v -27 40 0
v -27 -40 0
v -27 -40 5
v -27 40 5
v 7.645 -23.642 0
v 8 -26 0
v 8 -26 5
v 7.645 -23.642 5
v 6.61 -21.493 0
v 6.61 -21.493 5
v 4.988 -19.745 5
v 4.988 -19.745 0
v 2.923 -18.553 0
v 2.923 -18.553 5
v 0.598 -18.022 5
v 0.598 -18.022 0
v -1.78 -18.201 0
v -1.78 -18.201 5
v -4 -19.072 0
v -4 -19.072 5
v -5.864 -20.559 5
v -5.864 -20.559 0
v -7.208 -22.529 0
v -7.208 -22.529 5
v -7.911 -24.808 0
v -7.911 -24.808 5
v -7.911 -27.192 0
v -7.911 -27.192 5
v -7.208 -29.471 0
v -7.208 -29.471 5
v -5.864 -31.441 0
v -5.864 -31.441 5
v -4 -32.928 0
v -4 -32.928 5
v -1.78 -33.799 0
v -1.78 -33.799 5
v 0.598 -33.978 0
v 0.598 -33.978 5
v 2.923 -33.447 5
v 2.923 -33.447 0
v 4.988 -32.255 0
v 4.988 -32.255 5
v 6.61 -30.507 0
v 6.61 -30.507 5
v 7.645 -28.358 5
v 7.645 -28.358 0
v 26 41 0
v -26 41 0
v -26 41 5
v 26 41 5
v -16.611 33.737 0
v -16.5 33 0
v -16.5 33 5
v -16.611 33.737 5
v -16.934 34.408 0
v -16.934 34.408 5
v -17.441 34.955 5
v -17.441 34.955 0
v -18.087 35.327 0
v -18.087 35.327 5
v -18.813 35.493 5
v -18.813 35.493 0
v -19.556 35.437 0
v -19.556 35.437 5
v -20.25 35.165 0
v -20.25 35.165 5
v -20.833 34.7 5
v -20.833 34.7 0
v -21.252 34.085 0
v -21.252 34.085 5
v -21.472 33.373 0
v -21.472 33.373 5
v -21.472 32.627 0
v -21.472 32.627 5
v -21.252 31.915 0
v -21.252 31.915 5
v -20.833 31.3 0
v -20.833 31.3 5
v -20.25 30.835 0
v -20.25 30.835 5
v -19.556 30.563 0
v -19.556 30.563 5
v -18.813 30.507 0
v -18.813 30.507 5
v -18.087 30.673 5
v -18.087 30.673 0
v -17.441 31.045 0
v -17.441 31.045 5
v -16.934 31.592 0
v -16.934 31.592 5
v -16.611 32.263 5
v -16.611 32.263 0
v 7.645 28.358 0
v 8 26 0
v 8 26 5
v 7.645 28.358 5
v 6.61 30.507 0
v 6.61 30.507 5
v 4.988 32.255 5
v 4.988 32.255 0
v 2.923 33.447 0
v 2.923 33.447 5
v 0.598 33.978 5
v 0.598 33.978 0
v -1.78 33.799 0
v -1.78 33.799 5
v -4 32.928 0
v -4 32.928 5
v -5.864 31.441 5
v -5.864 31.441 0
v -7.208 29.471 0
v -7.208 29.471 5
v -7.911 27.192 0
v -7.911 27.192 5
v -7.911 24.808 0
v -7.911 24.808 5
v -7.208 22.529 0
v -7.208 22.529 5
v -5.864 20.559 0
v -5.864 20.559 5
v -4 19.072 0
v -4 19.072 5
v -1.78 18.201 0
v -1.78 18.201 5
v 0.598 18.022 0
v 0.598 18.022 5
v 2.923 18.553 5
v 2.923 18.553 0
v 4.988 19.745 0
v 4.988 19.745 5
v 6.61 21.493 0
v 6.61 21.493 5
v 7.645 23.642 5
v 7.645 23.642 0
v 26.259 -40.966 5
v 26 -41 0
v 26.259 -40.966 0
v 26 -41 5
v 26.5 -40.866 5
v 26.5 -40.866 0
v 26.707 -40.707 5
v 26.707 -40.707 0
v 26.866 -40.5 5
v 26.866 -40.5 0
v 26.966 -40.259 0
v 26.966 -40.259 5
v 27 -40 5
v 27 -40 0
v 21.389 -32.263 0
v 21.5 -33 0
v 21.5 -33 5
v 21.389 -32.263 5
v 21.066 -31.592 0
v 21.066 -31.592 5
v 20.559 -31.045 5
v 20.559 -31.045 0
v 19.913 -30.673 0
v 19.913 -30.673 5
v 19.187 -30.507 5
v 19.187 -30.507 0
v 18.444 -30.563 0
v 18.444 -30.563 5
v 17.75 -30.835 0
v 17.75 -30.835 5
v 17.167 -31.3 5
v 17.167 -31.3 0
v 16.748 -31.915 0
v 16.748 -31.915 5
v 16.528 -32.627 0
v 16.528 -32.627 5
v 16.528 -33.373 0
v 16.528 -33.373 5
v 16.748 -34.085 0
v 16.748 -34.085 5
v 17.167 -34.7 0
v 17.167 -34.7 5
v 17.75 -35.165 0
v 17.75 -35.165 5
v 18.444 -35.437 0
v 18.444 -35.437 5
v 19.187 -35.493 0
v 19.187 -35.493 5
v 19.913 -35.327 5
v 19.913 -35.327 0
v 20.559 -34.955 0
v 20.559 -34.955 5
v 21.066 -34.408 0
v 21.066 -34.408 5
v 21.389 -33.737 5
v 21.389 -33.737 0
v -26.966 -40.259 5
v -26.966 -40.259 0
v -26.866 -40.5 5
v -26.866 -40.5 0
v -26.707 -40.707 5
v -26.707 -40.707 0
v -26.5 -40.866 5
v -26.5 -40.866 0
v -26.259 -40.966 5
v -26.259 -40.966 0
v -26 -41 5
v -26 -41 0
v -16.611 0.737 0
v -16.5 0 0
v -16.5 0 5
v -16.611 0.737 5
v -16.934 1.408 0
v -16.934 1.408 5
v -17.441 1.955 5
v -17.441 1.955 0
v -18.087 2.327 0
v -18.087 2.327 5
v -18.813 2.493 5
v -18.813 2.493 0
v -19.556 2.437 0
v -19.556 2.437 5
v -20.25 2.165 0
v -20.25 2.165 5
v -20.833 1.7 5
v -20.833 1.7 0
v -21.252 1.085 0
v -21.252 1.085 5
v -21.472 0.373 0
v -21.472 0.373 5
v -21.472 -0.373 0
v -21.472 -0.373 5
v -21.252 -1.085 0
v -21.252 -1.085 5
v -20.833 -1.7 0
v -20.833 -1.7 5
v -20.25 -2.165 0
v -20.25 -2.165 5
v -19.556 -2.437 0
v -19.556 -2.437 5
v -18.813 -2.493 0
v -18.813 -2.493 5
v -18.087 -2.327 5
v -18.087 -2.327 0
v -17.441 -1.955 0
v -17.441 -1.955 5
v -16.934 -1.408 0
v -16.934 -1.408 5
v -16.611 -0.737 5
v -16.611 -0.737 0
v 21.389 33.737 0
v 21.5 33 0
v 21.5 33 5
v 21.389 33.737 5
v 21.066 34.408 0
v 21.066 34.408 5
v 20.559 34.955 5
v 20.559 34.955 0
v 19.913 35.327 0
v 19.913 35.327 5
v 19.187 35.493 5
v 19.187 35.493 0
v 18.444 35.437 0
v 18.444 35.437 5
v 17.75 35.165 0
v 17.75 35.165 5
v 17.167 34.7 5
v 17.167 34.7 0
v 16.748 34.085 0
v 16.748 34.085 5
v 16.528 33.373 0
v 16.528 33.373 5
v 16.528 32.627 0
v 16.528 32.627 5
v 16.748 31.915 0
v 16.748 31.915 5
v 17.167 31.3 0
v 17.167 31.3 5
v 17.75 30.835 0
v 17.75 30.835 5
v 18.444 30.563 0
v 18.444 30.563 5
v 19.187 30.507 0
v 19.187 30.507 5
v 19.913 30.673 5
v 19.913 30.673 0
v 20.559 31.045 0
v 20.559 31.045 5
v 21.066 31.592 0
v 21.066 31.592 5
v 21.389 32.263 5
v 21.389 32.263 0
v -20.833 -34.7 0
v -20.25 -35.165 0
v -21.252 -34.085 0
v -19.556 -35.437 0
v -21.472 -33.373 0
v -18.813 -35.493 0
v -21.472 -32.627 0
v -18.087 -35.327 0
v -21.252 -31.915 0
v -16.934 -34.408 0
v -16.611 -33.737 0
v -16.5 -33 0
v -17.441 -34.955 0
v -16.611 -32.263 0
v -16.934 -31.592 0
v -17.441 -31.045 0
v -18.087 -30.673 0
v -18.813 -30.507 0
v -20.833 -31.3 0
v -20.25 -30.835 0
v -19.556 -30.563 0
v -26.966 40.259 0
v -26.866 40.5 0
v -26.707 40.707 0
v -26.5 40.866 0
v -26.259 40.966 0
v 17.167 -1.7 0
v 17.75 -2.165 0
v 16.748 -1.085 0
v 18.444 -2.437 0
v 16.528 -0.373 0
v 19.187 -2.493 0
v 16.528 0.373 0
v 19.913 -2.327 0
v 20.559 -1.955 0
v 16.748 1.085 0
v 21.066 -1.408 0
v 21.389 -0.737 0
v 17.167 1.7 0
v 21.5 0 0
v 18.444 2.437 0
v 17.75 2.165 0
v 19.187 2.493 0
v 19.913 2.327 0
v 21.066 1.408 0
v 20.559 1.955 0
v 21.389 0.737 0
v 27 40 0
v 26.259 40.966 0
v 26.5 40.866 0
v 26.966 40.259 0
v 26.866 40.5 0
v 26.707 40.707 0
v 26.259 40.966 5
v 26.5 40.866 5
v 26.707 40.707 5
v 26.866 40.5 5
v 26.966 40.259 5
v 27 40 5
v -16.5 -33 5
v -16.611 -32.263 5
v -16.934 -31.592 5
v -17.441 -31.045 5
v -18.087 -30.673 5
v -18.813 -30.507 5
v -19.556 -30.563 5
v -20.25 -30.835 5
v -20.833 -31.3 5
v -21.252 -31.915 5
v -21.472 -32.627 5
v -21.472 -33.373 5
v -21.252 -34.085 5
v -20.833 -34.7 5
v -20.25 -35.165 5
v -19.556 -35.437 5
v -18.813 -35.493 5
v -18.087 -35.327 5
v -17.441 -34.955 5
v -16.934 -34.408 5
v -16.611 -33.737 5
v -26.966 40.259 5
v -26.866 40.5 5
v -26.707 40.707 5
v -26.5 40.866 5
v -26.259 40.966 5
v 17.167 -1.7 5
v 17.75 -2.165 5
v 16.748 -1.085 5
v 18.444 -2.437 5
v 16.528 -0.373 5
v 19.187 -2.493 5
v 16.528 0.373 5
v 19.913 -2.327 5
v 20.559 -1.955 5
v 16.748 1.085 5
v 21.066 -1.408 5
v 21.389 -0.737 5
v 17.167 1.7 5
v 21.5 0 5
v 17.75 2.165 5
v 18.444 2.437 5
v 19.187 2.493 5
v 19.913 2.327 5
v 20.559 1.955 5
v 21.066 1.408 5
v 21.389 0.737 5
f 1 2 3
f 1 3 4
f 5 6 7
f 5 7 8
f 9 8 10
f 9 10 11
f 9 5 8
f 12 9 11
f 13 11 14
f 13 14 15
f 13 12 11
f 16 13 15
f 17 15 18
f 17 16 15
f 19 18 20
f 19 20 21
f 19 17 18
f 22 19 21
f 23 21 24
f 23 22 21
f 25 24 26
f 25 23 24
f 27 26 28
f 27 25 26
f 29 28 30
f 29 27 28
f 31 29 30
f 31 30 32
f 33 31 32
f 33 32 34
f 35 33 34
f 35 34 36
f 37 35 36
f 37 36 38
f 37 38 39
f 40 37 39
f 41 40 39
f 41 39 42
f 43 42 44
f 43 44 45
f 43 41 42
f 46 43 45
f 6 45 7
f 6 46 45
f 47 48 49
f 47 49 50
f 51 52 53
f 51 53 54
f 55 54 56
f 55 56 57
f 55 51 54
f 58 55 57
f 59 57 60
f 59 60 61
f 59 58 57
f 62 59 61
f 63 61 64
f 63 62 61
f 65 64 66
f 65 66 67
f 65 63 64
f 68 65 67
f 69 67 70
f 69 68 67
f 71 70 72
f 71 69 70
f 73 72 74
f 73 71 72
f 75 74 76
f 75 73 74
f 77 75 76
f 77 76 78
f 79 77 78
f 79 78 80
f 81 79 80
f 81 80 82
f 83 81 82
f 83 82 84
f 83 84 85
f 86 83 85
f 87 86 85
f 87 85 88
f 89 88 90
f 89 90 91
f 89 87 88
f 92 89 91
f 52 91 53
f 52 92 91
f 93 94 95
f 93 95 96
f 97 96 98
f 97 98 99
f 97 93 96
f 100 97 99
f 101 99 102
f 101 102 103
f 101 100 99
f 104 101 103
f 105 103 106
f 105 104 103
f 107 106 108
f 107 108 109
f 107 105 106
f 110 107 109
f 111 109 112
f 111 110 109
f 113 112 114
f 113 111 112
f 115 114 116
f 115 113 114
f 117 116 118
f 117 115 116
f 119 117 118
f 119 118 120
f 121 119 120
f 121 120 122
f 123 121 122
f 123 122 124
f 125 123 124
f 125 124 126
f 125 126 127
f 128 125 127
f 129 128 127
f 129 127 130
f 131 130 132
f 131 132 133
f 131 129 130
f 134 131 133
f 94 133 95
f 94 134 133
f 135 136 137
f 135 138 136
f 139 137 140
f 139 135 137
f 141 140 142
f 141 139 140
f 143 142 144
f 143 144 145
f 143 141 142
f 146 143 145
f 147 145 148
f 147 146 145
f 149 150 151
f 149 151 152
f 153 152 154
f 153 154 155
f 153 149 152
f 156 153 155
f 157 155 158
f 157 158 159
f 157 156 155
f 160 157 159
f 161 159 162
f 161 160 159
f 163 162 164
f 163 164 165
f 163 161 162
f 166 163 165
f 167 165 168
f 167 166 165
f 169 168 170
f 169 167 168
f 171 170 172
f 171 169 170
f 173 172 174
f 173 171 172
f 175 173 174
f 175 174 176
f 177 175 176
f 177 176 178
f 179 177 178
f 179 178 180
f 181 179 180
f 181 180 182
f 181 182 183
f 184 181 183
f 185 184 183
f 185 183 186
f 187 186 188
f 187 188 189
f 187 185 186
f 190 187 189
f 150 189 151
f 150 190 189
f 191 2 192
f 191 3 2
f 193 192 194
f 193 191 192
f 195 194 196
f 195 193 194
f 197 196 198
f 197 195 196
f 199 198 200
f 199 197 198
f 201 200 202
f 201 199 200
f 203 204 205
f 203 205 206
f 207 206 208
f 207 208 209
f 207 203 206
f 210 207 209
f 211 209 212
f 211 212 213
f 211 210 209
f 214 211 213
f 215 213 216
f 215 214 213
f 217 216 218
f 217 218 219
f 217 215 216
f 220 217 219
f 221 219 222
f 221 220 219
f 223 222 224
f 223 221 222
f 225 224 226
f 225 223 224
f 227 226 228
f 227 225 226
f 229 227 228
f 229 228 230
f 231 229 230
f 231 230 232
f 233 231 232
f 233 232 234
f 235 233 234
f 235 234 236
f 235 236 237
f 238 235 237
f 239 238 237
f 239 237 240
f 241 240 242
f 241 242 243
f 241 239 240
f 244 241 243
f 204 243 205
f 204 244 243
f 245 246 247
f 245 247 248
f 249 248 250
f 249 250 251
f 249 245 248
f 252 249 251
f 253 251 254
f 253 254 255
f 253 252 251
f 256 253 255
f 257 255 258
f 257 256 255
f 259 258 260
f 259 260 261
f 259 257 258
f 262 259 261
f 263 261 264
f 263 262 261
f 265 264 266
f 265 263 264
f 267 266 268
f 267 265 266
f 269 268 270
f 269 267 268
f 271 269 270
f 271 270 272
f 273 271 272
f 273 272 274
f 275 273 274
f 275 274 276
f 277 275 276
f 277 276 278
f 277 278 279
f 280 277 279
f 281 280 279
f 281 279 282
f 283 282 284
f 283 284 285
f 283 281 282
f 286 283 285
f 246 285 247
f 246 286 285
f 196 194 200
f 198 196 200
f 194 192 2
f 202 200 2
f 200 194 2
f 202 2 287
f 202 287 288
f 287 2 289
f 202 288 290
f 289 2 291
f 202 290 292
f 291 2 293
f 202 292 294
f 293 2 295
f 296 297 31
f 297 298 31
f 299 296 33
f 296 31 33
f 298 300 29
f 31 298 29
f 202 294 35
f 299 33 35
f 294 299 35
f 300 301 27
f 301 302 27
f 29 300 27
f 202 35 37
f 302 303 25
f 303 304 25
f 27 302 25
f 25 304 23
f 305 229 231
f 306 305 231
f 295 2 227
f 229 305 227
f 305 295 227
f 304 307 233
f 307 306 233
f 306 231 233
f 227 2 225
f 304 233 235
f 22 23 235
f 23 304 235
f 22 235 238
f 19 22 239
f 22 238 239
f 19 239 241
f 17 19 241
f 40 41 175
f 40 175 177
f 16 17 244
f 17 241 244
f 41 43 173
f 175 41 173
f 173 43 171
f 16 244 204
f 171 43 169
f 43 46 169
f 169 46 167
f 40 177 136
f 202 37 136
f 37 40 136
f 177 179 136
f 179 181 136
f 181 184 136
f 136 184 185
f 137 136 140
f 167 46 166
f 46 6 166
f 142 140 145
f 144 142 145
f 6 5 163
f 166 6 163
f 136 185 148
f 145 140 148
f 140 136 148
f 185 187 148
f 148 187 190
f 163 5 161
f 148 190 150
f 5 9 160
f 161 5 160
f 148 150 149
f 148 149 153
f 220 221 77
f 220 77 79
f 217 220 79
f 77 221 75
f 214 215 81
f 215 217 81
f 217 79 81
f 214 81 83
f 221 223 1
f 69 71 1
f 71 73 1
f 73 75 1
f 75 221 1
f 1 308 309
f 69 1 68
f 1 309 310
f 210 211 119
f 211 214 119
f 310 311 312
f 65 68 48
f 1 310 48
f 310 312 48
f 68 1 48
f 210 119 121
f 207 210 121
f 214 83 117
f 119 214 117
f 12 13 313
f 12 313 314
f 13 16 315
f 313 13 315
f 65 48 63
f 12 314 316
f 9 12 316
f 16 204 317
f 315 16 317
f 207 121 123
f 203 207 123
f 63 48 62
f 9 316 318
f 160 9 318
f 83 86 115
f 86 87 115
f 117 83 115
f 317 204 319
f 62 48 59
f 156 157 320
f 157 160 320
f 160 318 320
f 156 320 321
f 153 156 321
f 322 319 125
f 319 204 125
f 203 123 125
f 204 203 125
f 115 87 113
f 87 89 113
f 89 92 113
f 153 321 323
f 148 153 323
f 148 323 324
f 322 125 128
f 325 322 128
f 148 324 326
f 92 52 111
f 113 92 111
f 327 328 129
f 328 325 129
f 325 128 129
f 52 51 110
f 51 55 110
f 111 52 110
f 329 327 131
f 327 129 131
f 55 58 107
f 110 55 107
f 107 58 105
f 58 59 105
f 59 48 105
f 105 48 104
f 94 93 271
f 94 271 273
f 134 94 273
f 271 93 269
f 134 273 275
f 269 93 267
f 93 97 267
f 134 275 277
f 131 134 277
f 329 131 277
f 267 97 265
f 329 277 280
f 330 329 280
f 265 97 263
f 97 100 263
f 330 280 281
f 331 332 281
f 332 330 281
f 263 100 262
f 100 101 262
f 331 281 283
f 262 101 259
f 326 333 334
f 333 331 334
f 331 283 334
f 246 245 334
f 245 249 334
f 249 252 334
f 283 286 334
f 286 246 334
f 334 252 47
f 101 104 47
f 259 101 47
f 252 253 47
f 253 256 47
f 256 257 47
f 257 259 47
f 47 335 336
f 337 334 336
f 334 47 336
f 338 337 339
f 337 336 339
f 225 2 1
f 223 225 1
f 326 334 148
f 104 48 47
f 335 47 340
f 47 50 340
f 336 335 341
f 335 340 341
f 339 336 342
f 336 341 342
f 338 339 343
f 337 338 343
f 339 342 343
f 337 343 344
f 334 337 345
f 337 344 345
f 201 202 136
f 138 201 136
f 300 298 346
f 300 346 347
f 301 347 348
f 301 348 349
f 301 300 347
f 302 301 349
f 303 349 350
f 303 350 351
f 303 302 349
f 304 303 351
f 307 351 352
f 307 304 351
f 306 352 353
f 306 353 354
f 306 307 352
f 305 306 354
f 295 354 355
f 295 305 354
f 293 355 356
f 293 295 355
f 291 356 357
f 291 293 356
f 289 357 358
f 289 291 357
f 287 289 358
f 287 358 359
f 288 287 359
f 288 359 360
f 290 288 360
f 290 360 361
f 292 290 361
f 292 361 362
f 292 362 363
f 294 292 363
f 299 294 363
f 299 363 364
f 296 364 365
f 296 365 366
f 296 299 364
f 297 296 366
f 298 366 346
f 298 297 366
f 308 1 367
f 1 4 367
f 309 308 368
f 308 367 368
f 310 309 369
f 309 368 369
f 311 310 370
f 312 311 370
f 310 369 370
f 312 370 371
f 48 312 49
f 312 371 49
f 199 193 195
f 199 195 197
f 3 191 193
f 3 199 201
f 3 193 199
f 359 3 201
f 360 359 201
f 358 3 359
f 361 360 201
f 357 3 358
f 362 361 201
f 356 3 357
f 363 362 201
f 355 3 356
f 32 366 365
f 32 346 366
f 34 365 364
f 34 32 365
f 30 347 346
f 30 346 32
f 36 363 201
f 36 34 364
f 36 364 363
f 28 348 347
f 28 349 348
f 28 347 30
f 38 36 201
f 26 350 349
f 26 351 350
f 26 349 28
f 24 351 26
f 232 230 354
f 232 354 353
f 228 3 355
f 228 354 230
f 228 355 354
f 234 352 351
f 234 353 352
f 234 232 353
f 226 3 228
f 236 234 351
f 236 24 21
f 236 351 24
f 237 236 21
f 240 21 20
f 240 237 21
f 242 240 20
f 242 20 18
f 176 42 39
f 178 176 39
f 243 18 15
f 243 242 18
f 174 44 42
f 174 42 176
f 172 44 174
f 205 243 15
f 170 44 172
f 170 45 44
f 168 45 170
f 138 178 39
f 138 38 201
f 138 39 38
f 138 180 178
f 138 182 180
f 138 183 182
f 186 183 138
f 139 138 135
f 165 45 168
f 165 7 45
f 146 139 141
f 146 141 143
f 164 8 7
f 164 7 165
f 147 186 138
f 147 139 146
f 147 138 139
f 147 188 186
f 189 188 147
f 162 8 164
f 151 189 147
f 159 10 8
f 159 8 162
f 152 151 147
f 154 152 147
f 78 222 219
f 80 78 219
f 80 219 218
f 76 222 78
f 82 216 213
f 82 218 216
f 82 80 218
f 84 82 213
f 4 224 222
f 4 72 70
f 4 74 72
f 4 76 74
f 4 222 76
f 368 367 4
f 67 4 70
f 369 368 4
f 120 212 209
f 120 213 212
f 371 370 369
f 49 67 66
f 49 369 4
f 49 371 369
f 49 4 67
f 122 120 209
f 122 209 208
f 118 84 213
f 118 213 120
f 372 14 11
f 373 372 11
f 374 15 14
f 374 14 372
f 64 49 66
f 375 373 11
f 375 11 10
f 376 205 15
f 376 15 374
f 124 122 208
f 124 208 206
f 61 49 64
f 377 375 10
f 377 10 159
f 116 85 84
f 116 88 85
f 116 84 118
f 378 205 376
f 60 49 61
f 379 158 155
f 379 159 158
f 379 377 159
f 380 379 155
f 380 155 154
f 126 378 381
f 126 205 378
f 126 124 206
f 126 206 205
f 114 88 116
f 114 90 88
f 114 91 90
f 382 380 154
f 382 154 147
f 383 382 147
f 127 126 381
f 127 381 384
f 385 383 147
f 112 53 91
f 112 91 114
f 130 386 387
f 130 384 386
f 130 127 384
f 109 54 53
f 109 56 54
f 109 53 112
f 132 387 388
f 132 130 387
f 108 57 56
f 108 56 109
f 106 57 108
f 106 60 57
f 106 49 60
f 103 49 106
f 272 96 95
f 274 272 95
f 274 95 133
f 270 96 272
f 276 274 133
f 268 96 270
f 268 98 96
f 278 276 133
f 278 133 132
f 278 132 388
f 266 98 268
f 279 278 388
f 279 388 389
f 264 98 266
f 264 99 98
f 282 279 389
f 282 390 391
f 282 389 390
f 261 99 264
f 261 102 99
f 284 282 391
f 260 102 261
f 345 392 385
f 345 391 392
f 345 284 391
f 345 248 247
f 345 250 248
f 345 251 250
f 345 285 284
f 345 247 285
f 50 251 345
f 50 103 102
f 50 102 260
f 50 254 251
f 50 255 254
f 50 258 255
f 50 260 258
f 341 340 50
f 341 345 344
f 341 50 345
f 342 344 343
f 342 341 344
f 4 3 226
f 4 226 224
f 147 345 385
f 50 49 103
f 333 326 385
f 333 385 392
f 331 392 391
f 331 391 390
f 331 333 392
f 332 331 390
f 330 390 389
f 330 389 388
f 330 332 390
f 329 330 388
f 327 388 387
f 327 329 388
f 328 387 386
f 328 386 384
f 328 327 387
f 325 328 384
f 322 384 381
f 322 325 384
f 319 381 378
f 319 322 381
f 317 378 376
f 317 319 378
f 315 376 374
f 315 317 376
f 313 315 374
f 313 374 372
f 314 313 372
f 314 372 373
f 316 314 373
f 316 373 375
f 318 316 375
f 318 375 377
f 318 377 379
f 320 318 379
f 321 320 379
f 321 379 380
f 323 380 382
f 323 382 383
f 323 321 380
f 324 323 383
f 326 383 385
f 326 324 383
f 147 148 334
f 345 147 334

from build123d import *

# Parameters (mm, degrees)
F0_W     = 54
F0_H     = 82
F0_R     = 2.5
F0_R_2   = 8
F1_DEPTH = 5
F2_R     = 1


with BuildPart() as f1:
    # F0 (on Top) → F1 (new body)
    with BuildSketch(Plane.XY):
        Rectangle(F0_W, F0_H)
        with Locations((-19, -33)):
            Circle(F0_R, mode=Mode.SUBTRACT)
        with Locations((0, -26)):
            Circle(F0_R_2, mode=Mode.SUBTRACT)
        with Locations((19, -33)):
            Circle(F0_R, mode=Mode.SUBTRACT)
        with Locations((-19, 0)):
            Circle(F0_R, mode=Mode.SUBTRACT)
        with Locations((-19, 33)):
            Circle(F0_R, mode=Mode.SUBTRACT)
        with Locations((19, 0)):
            Circle(F0_R, mode=Mode.SUBTRACT)
        with Locations((0, 26)):
            Circle(F0_R_2, mode=Mode.SUBTRACT)
        with Locations((19, 33)):
            Circle(F0_R, mode=Mode.SUBTRACT)
    extrude(amount=F1_DEPTH)

    # F2
    f2_edges = [f1.edges().sort_by_distance(p)[0] for p in [
        (27, -41, 2.5),
        (-27, -41, 2.5),
        (-27, 41, 2.5),
        (27, 41, 2.5),
    ]]
    fillet(f2_edges, radius=F2_R)


solid = f1.part
